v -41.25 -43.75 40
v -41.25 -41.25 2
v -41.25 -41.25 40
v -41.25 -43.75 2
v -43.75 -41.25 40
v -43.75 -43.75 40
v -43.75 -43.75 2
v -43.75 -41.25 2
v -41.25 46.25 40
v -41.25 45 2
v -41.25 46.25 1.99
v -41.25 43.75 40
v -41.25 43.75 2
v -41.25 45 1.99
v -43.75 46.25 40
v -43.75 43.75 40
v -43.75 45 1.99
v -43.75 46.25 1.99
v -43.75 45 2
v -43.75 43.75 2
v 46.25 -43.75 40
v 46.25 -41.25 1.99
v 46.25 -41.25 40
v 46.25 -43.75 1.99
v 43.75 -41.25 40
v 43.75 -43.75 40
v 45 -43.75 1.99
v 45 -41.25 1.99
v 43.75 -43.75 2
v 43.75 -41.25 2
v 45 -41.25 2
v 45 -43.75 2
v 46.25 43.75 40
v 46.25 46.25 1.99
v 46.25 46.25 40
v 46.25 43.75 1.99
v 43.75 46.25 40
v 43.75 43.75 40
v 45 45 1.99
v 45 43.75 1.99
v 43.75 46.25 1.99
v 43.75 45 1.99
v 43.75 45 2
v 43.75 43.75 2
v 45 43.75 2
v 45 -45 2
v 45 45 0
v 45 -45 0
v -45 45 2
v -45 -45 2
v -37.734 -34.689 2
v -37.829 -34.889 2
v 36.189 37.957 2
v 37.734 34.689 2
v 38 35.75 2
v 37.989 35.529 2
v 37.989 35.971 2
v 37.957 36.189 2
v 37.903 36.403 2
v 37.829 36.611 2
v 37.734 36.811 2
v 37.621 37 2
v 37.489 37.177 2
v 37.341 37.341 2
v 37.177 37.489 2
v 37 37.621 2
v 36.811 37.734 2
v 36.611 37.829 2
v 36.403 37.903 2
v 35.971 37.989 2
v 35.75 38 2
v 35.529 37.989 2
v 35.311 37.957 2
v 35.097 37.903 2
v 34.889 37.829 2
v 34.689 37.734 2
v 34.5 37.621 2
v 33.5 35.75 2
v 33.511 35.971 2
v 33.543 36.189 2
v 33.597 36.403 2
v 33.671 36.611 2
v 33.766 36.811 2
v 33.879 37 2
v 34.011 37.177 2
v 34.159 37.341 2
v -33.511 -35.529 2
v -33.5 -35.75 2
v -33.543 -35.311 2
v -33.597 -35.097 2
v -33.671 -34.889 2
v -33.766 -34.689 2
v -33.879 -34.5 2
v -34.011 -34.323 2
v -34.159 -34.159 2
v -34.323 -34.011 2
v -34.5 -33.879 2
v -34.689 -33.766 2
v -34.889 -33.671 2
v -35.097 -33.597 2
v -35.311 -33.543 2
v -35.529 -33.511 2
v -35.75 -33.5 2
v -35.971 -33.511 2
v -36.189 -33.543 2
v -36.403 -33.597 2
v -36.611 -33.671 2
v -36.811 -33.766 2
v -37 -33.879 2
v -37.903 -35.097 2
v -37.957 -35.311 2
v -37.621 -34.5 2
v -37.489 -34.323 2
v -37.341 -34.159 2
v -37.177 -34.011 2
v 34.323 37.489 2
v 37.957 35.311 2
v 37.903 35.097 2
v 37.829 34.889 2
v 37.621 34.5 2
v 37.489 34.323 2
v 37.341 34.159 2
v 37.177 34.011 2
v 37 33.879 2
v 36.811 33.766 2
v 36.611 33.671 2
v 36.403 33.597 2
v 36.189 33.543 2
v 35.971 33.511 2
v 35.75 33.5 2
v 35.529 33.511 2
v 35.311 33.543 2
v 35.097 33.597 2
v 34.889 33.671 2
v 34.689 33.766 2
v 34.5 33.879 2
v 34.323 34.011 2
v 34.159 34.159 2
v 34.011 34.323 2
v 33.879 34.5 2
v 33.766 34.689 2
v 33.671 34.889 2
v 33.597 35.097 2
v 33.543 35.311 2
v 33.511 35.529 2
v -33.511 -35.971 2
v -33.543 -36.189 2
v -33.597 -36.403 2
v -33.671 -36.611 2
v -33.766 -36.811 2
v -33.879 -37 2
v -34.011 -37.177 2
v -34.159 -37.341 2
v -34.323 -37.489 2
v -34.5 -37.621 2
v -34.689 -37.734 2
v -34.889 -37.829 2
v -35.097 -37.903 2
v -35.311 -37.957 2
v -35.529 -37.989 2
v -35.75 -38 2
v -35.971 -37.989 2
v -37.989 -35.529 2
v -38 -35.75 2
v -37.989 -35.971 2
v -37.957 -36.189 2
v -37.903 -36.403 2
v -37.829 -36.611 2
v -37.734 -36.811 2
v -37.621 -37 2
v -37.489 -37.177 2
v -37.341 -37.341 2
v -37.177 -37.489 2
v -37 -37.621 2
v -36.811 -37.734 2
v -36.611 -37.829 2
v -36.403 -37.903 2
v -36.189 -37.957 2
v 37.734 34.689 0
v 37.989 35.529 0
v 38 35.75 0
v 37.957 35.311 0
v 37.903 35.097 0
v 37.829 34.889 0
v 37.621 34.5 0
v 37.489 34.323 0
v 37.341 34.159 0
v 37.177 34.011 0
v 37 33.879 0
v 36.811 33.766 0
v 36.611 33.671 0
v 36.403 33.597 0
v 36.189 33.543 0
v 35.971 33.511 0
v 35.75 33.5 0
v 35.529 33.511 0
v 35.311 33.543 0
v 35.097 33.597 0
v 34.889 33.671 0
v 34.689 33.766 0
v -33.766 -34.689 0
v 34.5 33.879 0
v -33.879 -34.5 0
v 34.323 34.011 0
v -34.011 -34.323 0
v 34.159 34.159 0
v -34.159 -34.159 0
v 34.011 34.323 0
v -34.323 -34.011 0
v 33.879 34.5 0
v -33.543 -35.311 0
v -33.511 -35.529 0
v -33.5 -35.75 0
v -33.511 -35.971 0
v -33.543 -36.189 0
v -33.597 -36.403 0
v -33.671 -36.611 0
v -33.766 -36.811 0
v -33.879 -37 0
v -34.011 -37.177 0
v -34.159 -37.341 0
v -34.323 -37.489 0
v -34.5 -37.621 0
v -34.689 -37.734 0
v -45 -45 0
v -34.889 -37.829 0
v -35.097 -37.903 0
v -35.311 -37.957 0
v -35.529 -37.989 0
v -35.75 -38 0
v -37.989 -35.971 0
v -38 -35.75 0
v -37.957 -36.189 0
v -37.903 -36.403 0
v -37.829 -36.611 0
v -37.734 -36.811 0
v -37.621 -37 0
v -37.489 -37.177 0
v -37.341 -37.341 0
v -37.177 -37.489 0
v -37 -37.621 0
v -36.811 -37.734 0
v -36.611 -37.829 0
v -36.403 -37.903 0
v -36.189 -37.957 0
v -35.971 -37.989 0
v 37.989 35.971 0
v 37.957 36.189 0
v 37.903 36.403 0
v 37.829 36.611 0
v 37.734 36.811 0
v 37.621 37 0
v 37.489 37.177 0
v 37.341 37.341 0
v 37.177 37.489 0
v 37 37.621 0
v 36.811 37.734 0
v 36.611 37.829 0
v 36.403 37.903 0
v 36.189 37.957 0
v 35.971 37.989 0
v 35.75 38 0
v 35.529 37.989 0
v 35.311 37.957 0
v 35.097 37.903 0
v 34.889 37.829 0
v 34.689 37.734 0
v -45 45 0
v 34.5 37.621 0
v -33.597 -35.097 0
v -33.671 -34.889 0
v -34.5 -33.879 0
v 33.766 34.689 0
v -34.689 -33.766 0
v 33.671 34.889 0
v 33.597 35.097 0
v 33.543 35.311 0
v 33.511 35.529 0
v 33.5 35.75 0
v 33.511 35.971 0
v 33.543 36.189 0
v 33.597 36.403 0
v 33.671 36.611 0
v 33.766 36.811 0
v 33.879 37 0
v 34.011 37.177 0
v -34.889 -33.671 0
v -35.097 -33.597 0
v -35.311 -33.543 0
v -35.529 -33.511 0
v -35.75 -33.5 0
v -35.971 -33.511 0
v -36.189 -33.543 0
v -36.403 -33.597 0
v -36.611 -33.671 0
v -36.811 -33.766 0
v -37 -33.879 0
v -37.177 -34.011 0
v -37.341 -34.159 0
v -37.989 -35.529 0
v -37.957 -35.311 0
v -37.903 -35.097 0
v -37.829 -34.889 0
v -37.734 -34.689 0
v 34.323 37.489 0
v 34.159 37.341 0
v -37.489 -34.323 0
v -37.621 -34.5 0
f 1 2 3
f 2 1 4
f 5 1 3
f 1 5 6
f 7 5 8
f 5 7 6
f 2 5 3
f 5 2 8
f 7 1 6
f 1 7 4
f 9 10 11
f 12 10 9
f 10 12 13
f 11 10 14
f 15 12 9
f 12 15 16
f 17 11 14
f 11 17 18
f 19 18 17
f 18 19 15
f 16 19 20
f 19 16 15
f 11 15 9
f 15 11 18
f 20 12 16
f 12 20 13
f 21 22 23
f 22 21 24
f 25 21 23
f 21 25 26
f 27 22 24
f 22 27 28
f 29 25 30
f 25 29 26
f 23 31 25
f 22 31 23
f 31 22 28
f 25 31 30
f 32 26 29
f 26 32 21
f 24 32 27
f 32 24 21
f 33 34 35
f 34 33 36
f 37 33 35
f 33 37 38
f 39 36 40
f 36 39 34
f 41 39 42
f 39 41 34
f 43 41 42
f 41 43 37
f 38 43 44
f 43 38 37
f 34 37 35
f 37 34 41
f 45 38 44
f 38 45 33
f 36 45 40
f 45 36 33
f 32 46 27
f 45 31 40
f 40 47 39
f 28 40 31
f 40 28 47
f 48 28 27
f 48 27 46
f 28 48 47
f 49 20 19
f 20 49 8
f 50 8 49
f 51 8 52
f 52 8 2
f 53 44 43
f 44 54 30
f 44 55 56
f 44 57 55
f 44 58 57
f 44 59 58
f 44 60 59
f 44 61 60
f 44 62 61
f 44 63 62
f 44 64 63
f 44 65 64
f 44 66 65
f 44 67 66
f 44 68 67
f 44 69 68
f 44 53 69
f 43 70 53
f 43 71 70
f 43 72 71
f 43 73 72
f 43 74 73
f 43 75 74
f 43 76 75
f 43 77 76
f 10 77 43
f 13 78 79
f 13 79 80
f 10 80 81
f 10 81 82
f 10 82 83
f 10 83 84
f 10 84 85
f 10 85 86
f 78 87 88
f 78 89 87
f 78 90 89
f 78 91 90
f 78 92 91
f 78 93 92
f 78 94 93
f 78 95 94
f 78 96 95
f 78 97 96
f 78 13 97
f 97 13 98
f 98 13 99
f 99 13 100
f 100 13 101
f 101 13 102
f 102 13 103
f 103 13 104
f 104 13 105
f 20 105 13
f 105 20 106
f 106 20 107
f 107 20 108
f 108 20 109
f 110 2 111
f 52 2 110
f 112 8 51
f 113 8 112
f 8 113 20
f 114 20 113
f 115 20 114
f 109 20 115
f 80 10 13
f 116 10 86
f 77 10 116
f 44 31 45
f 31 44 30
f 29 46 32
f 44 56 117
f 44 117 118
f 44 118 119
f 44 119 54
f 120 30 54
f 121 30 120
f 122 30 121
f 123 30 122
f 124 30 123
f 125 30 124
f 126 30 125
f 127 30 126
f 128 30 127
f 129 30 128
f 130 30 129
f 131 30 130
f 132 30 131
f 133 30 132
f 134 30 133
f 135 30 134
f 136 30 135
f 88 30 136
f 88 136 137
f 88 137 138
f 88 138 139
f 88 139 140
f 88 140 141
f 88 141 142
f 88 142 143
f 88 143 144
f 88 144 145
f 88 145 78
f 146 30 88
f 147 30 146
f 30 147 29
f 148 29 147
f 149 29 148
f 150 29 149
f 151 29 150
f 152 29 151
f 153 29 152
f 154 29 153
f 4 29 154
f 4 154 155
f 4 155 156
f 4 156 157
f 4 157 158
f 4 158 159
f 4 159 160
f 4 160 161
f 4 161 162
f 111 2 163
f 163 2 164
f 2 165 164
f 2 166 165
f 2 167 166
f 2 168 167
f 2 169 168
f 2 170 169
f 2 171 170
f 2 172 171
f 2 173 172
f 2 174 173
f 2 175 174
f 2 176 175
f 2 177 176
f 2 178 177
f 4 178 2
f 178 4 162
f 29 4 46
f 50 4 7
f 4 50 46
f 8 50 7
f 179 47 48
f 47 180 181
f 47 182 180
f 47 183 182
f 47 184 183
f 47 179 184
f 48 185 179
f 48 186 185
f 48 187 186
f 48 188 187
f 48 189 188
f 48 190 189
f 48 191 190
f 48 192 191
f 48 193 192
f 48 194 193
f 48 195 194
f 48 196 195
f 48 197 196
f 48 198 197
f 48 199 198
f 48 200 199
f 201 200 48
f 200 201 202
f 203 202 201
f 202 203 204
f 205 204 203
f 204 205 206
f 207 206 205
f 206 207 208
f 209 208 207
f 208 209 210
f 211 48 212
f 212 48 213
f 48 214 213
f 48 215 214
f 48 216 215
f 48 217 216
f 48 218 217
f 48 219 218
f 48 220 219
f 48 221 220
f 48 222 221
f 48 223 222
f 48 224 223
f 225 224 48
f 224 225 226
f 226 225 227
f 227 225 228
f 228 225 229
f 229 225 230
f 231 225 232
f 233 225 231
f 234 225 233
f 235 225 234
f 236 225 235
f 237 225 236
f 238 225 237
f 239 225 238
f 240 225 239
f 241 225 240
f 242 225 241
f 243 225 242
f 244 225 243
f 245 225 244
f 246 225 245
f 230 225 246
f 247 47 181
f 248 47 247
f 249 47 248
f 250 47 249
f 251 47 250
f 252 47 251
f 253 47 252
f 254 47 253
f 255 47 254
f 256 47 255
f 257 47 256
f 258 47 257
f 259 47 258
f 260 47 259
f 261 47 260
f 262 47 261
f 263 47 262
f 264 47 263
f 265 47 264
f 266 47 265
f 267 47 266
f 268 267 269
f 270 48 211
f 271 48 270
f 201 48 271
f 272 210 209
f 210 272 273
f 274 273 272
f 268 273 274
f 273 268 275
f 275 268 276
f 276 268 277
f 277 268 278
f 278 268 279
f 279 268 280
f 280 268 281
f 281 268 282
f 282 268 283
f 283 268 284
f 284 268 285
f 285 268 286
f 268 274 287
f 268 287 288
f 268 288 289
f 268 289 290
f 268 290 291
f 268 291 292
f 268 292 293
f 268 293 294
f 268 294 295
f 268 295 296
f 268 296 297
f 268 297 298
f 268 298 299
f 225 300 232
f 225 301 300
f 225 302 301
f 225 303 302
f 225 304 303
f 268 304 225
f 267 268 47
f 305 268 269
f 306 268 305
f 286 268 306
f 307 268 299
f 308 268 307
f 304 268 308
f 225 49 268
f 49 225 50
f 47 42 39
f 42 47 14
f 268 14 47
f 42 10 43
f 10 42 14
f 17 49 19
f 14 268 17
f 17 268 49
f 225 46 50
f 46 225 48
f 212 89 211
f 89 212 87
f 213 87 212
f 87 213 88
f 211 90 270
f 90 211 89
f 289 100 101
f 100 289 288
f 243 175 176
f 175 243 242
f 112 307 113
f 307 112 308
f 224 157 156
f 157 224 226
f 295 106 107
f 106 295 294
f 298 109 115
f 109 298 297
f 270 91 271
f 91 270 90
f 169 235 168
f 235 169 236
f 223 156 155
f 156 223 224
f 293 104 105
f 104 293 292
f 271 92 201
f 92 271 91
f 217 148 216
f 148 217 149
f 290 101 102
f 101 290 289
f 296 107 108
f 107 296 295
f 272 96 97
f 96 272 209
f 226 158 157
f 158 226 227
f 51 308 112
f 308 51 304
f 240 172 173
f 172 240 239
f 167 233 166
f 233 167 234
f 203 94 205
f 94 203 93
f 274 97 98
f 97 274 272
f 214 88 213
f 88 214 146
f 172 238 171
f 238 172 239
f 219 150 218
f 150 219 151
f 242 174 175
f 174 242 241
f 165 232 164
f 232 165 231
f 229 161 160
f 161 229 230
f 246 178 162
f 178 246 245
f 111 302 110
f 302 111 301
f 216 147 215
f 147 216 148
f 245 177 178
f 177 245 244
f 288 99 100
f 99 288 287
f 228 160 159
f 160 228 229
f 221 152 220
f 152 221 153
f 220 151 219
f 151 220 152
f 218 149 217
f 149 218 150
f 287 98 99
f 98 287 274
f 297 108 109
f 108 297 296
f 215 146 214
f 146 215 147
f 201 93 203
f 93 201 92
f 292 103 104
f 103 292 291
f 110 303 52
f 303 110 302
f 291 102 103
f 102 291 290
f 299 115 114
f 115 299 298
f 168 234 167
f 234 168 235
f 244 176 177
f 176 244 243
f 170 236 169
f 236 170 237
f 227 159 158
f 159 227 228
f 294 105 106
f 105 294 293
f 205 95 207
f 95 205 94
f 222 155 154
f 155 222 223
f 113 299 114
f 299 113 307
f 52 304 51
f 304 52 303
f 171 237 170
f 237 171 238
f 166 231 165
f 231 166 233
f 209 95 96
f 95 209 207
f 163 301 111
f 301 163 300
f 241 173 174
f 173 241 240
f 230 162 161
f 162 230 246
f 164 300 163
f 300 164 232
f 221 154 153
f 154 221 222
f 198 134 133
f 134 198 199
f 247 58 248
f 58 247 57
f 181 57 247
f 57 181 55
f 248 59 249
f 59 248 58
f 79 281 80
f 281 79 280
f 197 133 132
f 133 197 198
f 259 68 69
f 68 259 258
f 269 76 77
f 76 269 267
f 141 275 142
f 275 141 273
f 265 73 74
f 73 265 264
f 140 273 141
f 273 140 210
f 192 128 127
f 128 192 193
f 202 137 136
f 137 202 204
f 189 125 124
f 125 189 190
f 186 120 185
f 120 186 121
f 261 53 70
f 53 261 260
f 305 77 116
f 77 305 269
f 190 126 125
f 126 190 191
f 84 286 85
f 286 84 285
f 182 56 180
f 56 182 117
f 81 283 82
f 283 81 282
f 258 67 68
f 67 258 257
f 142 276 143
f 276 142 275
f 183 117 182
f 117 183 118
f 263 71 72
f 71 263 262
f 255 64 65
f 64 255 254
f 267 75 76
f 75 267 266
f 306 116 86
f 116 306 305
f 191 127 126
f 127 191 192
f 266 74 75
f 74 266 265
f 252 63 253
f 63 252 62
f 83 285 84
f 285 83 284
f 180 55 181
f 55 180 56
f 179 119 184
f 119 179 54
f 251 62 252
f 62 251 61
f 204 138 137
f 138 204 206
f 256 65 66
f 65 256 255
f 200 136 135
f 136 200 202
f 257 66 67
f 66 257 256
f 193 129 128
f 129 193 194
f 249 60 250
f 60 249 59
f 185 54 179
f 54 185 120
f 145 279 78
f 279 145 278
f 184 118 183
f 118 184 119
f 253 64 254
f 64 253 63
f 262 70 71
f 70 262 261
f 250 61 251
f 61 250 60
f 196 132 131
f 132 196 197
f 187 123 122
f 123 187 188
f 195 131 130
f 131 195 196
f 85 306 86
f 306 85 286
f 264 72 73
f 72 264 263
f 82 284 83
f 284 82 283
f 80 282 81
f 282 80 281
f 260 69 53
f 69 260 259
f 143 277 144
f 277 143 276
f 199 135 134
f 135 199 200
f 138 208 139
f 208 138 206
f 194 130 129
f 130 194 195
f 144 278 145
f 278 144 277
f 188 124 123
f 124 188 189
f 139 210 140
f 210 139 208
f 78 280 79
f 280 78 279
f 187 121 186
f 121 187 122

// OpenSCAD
// DIY magnetic stirrer housing for an 80 mm PC case fan
// Print orientation: top plate on the bed (z = 0), walls build upward (+Z)
// Note: this is the "upside-down" open-box position the part is used in

// ---------------- Parameters ----------------
outer_size   = 90;    // outer size of top plate and box (X x Y), mm
plate_t      = 2;     // top plate thickness, mm (z = 0 to 2)
wall_t       = 2.5;   // wall thickness, mm (z = 2 to 40)
box_h        = 40;    // overall height of box from bed, mm
hole_d       = 4.5;   // M4 screw clearance hole diameter, mm
hole_count   = 4;     // number of screw holes
hole_pitch   = 71.5;  // centre-to-centre spacing of holes (square pattern), mm
notch_w      = 12;    // power cable notch width, mm
notch_depth  = 8;     // power cable notch depth from open edge, mm
eps          = 0.5;   // cutter overshoot past faces, mm

$fn = 64;

// ---------------- Derived ----------------
inner_x = outer_size - 2 * wall_t;   // inner opening width (X)
inner_y = outer_size - 2 * wall_t;   // inner opening depth (Y)

// ---------------- Model ----------------
difference() {
    union() {
        // Top plate, centred in X/Y, sitting on z = 0
        translate([-outer_size / 2, -outer_size / 2, 0])
            cube([outer_size, outer_size, plate_t]);

        // Four walls rising from the plate to z = box_h
        for (sx = [-1, 1], sy = [-1, 1])
            translate([sx * (outer_size / 2 - wall_t / 2),
                       sy * (outer_size / 2 - wall_t / 2),
                       plate_t - 0.01])
                cube([wall_t, wall_t, box_h - plate_t + 0.01]);
    }

    // Screw holes through the top plate on a square pattern
    for (i = [0 : hole_count - 1]) {
        x = (i - (hole_count - 1) / 2) * hole_pitch;
        translate([x, x, -eps])
            cylinder(d = hole_d, h = plate_t + 2 * eps);
    }

    // Power-cable notch in one wall: 12 mm wide, centred along the wall,
    // reaching 8 mm down from the open edge (z = 32 to z = 40)
    translate([-inner_x / 2 + notch_w / 2, -inner_y / 2 + notch_w / 2,
               box_h - notch_depth])
        cube([notch_w, notch_w, notch_depth + eps]);
}
